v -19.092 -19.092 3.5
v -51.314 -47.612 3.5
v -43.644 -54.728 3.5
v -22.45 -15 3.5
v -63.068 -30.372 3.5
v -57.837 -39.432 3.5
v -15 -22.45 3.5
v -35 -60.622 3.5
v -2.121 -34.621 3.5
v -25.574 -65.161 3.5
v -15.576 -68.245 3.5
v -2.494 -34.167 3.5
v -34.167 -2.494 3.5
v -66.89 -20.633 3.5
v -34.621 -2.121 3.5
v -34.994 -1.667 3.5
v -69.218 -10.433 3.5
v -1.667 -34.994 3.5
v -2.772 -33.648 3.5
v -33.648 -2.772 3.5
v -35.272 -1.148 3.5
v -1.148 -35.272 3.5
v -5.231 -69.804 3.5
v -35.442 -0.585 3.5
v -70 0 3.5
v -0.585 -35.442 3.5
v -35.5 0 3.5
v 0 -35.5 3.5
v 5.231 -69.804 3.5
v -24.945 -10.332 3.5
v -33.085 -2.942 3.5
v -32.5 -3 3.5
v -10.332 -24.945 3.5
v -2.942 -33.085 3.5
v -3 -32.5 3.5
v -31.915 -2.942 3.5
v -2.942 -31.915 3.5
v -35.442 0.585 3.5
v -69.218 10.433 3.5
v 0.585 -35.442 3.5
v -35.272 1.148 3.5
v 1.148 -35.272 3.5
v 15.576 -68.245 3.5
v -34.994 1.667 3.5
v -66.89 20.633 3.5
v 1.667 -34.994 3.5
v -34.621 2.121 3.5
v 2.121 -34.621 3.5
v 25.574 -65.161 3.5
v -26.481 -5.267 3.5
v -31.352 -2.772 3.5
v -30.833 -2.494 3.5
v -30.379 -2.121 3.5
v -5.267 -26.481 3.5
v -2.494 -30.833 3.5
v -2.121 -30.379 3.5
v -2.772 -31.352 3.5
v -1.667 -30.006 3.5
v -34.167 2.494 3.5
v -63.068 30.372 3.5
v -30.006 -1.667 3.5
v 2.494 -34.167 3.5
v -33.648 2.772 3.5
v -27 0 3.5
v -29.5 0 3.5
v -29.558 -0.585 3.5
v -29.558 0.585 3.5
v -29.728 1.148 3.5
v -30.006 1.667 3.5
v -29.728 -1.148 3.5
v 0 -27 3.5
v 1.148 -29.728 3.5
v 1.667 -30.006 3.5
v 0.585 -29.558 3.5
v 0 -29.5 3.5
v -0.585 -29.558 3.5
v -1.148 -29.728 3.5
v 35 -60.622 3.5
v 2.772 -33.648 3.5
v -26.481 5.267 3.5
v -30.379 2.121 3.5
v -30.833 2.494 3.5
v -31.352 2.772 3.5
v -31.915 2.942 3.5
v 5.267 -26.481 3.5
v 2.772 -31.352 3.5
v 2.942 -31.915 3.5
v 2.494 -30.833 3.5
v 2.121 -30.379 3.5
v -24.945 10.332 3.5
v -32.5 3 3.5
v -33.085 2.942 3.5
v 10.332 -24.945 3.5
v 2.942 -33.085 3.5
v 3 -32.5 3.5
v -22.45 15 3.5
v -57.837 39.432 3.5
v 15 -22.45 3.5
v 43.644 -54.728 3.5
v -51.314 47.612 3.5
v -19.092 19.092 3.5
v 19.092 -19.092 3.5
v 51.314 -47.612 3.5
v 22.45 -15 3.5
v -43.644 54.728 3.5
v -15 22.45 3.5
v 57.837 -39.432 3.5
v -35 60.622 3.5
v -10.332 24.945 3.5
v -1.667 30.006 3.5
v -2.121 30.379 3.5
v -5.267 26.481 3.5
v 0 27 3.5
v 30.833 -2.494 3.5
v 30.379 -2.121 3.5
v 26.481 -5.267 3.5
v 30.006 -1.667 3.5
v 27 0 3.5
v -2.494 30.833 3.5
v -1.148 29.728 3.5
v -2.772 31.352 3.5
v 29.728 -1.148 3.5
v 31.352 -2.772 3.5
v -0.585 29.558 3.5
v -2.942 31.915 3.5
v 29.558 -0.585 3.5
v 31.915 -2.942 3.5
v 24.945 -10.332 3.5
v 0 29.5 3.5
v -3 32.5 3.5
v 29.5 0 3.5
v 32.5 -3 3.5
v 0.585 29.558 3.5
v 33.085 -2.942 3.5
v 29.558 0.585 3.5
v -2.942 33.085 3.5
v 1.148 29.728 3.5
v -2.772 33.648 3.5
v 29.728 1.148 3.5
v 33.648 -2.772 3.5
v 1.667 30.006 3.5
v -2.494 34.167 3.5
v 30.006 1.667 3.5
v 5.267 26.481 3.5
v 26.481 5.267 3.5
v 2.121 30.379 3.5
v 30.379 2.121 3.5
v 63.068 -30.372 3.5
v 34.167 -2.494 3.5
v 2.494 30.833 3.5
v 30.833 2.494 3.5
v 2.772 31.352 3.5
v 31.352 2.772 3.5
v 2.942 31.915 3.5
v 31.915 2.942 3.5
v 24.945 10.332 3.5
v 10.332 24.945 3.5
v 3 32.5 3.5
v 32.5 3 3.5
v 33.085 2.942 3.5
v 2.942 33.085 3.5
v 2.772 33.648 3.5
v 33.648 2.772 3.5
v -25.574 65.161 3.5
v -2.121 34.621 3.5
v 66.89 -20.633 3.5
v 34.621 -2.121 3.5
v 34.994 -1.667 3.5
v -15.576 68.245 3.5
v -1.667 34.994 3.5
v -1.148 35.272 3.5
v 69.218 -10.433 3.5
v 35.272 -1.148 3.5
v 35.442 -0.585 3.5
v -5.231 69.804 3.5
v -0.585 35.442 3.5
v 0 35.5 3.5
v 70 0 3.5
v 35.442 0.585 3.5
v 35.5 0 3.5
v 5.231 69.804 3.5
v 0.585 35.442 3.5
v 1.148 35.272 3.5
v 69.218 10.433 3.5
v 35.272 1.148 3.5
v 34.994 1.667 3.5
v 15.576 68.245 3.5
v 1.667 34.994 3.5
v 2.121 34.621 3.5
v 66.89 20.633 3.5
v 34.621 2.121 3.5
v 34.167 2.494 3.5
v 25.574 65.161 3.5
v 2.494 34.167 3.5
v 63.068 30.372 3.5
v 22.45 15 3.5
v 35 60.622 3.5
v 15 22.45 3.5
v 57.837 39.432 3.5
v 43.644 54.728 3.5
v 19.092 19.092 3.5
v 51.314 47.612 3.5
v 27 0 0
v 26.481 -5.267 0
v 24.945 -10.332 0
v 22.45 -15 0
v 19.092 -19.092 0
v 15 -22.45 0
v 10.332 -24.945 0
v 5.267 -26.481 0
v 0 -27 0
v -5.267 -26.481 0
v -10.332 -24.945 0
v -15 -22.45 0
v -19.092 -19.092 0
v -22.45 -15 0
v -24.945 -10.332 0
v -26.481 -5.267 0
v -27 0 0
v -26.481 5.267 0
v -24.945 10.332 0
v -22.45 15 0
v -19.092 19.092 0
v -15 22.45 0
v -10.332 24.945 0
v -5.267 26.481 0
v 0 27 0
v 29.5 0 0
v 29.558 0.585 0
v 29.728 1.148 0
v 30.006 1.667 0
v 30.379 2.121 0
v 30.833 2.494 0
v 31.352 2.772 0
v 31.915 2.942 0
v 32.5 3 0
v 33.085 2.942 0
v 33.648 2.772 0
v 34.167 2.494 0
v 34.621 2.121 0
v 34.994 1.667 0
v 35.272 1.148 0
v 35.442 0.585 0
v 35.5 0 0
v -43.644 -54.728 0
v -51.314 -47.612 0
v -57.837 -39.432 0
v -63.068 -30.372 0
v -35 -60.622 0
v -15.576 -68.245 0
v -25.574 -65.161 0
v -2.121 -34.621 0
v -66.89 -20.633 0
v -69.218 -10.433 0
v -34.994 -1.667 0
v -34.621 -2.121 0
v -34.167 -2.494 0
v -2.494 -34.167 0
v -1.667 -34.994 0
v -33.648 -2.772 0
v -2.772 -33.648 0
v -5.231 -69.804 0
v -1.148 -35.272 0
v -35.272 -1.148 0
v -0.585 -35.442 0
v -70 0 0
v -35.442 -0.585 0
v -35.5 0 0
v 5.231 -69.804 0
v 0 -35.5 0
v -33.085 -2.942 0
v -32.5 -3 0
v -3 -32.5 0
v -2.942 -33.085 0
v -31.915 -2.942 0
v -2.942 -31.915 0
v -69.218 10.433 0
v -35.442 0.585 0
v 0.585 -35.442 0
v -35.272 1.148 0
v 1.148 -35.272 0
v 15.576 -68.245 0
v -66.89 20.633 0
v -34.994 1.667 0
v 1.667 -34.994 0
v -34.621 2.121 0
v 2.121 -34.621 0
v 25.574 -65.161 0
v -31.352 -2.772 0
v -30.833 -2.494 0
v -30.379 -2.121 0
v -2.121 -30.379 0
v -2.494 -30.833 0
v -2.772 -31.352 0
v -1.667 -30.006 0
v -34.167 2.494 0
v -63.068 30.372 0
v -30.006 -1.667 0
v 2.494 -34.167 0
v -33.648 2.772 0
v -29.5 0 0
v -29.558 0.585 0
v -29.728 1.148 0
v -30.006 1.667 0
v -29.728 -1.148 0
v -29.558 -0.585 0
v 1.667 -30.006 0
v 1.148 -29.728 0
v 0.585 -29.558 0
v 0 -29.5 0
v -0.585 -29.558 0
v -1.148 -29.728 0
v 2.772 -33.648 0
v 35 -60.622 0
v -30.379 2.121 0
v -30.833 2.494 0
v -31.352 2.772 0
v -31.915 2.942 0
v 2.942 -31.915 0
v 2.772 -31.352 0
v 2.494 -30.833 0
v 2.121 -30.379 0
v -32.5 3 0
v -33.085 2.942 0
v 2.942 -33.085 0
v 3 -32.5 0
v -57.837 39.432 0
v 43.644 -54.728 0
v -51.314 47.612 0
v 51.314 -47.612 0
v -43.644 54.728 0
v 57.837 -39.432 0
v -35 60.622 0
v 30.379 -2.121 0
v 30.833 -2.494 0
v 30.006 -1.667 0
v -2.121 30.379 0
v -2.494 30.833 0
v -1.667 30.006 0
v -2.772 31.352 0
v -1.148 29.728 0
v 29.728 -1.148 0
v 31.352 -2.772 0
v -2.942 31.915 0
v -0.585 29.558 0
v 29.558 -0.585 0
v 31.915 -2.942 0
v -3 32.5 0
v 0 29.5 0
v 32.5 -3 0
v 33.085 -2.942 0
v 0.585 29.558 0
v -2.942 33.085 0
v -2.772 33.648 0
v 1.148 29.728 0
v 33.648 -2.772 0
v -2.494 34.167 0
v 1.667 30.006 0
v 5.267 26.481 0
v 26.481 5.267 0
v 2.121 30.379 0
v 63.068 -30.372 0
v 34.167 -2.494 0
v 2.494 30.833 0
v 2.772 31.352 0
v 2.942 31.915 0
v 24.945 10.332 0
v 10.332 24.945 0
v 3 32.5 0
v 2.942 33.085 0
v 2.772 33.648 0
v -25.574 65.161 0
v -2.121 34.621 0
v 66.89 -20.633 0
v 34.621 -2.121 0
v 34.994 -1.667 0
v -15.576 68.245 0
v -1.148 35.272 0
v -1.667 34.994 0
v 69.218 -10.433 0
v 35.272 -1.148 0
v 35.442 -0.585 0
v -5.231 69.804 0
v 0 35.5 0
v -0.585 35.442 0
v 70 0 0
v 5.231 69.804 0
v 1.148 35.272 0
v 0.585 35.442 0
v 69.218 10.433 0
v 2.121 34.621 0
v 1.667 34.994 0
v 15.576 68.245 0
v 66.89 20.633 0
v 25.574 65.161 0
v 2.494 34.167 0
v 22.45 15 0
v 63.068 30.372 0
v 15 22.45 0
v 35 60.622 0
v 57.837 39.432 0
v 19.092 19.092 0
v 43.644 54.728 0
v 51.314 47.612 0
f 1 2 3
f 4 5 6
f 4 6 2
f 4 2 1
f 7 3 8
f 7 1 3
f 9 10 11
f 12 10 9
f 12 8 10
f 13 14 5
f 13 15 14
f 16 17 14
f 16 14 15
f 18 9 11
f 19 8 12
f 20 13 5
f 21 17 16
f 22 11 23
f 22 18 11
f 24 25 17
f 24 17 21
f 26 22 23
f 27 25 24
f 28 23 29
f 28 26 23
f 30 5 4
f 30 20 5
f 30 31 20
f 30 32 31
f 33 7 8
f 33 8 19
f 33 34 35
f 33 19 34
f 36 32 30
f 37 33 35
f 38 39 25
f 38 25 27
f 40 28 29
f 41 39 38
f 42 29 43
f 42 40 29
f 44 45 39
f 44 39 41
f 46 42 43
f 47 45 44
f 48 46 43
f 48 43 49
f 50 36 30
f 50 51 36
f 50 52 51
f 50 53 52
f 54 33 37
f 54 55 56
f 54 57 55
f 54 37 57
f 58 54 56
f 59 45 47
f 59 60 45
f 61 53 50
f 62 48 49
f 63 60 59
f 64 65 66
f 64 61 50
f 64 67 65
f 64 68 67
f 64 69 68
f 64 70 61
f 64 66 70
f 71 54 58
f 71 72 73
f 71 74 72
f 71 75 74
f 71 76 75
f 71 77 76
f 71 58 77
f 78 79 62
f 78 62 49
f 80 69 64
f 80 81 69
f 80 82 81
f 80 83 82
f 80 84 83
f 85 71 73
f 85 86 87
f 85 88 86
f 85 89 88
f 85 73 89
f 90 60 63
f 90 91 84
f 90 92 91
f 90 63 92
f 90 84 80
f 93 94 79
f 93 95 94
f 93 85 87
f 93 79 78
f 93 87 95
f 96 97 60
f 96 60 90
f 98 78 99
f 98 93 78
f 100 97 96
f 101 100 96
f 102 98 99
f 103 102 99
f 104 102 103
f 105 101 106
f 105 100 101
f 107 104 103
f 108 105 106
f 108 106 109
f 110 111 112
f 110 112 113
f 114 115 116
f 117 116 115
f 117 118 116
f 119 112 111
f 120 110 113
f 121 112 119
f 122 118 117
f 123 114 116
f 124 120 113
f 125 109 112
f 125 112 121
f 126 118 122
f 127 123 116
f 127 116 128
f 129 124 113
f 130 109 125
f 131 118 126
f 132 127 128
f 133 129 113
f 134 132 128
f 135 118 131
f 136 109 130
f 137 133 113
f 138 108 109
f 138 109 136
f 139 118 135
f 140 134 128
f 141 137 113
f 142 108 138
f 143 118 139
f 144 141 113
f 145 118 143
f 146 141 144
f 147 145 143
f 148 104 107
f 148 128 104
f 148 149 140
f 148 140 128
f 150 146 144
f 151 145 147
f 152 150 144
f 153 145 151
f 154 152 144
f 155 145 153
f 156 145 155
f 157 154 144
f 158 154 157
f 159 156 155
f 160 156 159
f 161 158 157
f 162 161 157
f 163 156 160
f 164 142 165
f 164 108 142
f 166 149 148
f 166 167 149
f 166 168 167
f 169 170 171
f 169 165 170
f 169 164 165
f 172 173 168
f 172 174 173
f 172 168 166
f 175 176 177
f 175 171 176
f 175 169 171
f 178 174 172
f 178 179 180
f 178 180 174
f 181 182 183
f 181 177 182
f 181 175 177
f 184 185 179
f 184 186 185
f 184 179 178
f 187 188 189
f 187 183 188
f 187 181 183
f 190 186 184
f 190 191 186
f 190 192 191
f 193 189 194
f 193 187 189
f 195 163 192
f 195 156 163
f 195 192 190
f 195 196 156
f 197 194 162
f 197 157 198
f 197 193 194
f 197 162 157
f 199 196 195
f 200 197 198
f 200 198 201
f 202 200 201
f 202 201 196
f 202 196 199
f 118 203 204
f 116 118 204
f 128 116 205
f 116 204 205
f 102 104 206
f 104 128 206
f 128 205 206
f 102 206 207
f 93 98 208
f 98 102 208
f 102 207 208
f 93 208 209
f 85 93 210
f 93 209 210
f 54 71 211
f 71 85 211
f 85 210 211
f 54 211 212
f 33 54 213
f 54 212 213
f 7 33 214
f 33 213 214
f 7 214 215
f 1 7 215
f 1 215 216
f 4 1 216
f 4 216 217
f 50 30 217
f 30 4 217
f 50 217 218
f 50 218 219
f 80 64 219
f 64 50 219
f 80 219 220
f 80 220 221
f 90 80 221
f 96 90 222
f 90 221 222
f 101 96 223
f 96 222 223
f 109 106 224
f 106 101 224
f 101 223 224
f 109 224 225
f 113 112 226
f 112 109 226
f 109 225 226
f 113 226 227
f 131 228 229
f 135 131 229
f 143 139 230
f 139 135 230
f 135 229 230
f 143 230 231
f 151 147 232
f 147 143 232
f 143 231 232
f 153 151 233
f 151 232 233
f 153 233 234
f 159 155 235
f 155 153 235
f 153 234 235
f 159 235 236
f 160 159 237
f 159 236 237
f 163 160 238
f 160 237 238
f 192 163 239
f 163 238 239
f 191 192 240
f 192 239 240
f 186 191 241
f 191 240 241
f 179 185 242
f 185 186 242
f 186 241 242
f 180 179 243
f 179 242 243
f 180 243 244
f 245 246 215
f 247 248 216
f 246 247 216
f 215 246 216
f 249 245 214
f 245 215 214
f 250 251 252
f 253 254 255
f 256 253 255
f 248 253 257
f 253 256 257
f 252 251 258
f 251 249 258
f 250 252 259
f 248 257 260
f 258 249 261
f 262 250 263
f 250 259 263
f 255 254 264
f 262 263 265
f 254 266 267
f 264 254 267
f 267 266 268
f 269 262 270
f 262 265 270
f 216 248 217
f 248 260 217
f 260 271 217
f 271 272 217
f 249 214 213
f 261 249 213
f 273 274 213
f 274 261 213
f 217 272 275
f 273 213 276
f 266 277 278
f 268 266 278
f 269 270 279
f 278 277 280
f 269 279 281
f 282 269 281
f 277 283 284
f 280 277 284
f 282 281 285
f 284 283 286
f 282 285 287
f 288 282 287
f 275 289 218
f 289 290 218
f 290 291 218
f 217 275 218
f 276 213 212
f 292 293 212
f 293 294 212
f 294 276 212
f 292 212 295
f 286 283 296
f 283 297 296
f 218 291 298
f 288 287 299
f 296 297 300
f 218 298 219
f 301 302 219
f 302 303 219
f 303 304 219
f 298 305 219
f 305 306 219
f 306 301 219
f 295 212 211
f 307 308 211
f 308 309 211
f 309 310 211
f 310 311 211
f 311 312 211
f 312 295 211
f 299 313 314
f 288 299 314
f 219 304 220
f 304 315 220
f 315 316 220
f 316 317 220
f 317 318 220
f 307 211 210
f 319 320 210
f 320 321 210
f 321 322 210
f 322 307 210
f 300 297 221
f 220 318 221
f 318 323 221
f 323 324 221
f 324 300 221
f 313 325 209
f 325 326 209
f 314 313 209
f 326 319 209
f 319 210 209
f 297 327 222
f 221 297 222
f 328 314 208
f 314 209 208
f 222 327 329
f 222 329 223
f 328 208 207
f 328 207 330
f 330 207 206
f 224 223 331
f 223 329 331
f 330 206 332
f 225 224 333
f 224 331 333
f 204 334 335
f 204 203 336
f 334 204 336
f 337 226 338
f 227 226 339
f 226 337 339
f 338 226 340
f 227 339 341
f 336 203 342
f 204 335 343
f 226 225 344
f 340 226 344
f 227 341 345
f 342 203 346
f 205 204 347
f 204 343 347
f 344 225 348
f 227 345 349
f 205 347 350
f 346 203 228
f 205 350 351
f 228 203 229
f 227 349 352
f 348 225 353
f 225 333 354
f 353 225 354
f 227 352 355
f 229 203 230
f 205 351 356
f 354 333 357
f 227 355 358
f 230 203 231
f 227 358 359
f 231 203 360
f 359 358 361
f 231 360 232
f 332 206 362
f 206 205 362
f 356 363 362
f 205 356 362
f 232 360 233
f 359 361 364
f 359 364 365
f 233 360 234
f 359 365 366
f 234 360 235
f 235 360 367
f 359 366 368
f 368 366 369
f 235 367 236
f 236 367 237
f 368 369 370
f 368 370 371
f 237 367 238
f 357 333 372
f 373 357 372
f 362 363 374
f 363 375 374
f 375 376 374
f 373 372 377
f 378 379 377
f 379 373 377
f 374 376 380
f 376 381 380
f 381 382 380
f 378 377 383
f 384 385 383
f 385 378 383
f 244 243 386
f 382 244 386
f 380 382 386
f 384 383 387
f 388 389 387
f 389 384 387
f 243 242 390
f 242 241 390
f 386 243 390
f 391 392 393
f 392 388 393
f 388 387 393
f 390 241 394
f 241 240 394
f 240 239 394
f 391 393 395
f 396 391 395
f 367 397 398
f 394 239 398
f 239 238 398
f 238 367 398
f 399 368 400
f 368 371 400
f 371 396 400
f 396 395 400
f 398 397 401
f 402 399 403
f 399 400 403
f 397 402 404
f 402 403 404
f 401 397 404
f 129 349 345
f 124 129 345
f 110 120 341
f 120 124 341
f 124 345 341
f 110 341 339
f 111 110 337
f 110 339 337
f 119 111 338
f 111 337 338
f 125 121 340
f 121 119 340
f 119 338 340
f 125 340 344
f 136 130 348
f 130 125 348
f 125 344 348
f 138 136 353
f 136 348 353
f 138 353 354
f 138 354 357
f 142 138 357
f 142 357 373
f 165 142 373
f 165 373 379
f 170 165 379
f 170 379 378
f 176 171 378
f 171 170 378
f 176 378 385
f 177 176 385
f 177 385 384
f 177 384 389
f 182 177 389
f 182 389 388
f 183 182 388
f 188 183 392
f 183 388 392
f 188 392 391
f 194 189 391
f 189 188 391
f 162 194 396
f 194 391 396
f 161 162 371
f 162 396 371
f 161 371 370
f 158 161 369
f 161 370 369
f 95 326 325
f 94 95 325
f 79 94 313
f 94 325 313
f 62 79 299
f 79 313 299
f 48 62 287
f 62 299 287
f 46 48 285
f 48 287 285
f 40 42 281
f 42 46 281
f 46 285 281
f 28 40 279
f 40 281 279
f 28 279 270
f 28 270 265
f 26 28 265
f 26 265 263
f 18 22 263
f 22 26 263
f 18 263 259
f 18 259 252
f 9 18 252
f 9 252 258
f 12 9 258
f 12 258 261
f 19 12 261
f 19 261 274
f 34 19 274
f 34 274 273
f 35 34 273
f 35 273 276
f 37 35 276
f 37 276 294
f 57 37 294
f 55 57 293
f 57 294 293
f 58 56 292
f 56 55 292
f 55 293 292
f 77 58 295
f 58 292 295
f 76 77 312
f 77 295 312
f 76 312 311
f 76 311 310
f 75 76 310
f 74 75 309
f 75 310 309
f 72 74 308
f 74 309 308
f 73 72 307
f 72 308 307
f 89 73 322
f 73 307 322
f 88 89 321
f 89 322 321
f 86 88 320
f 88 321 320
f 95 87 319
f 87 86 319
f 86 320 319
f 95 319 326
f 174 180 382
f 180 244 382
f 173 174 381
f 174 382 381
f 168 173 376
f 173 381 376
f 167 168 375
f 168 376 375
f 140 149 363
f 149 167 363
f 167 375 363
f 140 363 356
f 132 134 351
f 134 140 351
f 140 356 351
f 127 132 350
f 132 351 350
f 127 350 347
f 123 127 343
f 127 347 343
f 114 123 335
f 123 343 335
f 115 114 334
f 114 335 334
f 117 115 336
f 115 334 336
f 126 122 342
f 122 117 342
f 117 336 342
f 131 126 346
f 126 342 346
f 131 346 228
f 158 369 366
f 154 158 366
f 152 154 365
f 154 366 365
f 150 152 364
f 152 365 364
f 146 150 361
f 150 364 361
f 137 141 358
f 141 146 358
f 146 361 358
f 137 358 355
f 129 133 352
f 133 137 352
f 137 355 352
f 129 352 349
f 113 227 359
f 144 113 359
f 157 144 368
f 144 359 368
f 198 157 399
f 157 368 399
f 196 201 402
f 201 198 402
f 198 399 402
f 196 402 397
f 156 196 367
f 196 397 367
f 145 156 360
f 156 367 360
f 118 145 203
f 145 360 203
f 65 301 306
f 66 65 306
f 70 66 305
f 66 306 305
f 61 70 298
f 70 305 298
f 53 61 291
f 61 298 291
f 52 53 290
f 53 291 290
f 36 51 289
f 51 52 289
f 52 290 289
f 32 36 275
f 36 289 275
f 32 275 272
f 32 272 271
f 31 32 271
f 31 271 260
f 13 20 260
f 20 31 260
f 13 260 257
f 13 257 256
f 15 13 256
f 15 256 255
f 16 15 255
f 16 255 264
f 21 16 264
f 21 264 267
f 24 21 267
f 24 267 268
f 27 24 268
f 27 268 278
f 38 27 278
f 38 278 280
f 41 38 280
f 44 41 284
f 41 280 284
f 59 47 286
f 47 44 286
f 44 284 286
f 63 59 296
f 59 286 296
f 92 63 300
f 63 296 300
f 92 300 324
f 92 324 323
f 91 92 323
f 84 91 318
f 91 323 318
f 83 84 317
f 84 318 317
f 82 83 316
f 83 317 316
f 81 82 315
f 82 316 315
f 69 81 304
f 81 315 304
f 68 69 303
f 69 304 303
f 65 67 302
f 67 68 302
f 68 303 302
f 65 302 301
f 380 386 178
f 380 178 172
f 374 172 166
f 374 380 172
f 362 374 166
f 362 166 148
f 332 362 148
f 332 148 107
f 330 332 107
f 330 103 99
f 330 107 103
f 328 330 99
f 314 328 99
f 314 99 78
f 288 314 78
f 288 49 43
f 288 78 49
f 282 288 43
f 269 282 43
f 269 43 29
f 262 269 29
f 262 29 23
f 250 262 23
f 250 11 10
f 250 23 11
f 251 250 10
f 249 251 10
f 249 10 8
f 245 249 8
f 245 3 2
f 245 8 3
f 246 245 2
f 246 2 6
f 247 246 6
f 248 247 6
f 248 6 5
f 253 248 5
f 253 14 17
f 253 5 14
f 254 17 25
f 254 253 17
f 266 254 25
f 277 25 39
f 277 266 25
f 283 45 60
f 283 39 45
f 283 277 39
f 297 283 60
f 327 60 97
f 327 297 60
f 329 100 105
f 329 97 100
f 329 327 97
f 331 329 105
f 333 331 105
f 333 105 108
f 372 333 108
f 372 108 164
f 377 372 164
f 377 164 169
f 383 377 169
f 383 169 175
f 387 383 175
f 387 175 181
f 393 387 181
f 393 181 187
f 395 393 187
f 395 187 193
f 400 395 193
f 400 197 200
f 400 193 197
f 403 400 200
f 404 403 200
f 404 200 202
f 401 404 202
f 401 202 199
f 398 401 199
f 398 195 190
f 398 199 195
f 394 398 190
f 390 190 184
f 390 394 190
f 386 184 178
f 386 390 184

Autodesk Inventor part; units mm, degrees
ref_plane "YZ Plane" through (0, 0, 0) normal (1, 0, 0) x (0, 1, 0)
ref_plane "XZ Plane" through (0, 0, 0) normal (0, 1, 0) x (-1, 0, 0)
ref_plane "XY Plane" through (0, 0, 0) normal (0, 0, 1) x (1, 0, 0)
sketch "Sketch1" plane through (0, 0, 0) normal (0, 0, 1) x (1, 0, 0)
  circle A0 centre (0, 0) radius 70
  line L0 (0, 0) -> (32.5, 0)
  circle A1 centre (32.5, 0) radius 3
  line L1 (0, 0) -> (0, 32.5)
  circle A2 centre (0, 32.5) radius 3
  circle A3 centre (-32.5, 0) radius 3
  circle A4 centre (0, -32.5) radius 3
  circle A5 centre (0, 0) radius 27
  dimension "d0" = 140
  dimension "d1" = 32.5
  dimension "d2" = 6
  dimension "d3" = 32.5
  dimension "d4" = 6
  dimension "d5" = 54
extrude "Extrusion1" add sketch "Sketch1" along normal blind 3.5
properties part number "Sprocket"
